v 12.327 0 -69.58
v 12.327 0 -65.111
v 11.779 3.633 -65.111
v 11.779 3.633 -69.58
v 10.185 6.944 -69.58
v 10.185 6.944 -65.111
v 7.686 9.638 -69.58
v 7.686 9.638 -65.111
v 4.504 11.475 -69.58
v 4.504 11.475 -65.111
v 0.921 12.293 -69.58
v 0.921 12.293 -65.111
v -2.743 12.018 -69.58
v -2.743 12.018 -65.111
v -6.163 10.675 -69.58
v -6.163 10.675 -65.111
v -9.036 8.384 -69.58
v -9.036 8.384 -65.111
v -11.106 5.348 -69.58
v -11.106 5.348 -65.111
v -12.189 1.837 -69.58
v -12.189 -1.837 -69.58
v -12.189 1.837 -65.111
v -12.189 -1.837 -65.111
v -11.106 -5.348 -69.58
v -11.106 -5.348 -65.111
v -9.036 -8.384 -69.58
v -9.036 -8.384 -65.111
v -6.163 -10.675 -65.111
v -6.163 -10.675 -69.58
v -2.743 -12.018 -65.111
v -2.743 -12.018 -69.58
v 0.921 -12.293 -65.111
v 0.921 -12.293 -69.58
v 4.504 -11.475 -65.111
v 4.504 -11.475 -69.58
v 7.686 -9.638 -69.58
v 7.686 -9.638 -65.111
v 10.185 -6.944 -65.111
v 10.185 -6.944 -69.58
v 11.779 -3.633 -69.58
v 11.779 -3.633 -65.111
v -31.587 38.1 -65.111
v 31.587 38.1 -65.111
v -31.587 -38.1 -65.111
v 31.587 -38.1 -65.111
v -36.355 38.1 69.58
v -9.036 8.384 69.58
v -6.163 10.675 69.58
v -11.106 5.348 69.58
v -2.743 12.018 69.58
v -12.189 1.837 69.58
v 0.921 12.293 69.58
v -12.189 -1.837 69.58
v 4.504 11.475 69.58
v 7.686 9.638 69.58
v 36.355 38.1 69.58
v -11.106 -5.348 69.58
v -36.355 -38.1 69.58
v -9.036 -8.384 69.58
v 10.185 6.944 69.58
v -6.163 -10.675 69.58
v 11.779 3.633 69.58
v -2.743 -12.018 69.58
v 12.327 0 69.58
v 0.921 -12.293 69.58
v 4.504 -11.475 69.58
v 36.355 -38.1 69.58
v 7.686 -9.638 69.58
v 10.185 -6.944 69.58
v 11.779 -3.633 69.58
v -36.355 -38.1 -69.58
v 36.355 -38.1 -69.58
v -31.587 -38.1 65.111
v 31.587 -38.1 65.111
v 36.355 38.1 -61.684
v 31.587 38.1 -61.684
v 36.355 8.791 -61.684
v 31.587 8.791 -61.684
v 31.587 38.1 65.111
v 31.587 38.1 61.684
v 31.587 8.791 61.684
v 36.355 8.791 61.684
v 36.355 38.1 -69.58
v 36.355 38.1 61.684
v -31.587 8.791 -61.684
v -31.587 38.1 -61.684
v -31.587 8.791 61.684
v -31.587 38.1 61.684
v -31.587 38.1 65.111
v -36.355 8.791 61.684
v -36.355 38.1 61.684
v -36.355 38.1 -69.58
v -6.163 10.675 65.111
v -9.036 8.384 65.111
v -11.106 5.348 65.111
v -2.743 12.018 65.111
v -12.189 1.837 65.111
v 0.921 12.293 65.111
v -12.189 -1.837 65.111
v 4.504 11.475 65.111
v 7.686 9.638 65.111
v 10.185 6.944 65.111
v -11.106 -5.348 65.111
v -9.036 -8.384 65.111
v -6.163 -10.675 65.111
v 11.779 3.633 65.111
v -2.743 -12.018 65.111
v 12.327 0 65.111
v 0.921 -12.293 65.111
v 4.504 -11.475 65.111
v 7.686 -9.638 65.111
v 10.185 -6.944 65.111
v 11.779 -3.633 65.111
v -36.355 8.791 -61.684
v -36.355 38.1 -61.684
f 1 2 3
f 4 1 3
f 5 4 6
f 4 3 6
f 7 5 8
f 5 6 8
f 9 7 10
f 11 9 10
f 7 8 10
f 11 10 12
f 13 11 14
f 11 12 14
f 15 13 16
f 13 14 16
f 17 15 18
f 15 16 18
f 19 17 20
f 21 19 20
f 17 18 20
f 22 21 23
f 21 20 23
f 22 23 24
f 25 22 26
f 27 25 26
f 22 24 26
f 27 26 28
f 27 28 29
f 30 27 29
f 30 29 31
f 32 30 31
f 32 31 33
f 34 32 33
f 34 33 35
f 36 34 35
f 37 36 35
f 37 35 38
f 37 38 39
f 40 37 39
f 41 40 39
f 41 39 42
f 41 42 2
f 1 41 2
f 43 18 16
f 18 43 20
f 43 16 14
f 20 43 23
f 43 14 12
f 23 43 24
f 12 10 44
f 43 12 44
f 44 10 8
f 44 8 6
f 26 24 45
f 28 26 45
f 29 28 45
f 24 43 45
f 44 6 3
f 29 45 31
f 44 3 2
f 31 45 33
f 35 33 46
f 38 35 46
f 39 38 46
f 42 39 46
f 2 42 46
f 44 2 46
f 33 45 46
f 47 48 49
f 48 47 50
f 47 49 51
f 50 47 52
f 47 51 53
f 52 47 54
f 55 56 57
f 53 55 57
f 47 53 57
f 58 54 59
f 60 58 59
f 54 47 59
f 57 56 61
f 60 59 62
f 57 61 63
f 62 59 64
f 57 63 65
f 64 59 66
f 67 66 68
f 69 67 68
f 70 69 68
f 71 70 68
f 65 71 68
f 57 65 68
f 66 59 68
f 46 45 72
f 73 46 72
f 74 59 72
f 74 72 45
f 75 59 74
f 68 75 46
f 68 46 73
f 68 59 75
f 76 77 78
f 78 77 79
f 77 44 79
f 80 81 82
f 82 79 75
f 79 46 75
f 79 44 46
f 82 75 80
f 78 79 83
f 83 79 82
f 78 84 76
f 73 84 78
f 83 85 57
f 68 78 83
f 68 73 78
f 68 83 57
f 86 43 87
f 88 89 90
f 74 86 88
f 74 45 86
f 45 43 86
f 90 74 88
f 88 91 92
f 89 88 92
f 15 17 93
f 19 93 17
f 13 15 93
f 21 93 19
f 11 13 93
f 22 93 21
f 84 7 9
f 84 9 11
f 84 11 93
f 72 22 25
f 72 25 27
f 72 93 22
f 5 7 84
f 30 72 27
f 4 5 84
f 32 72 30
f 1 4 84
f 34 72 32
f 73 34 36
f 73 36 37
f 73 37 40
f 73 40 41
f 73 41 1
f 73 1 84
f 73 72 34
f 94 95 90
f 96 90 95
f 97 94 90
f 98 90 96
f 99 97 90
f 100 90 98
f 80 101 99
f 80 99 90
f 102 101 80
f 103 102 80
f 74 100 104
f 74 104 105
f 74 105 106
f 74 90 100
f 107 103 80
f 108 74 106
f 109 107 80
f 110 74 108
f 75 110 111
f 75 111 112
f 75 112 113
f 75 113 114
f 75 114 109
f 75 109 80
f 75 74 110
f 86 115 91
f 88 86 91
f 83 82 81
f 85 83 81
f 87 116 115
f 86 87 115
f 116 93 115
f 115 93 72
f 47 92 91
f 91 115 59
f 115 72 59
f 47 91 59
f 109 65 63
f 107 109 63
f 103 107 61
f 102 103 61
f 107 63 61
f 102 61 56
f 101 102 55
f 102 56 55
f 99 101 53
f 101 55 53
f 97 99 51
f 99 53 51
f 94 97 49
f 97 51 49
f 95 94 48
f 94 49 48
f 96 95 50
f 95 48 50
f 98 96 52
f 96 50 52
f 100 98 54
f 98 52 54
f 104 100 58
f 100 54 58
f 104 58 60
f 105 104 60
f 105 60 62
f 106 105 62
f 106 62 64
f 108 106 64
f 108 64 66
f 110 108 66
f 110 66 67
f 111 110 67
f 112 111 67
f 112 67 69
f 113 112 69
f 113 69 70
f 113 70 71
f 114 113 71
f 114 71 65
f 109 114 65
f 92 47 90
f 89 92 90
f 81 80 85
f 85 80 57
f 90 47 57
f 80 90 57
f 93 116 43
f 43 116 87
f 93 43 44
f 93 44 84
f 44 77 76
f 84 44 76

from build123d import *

# Parameters (mm, degrees)
F0_W     = 72.709278
F0_H     = 139.160782
F1_DEPTH = 38.1
F2_W     = 63.17363
F2_H     = 130.221114
F3_DEPTH = 76.201
F4_R     = 12.32698
F5_DEPTH = 139.161782
F6_W     = 29.30933
F6_H     = 123.367376
F7_DEPTH = 72.710277


with BuildPart() as f1:
    # F0 (on Front) → F1 (new body, symmetric)
    with BuildSketch(Plane.XZ):
        Rectangle(F0_W, F0_H)
    extrude(amount=F1_DEPTH, both=True)

    # F2 (on face) → F3 (cut, through all)
    with BuildSketch(Plane.XZ.offset(38.1)):
        Rectangle(F2_W, F2_H)
    extrude(amount=-F3_DEPTH, mode=Mode.SUBTRACT)

    # F4 (on face) → F5 (cut, through all)
    with BuildSketch(Plane.XY.offset(69.580391)):
        Circle(F4_R)
    extrude(amount=-F5_DEPTH, mode=Mode.SUBTRACT)

    # F6 (on face) → F7 (cut, through all)
    with BuildSketch(Plane(origin=(-36.354639, 0, 0), x_dir=(0, -1, 0), z_dir=(-1, 0, 0))):
        with Locations((-23.445335, 0)):
            Rectangle(F6_W, F6_H)
        with Locations((-52.754665, 0)):
            Rectangle(F6_W, F6_H)
    extrude(amount=-F7_DEPTH, mode=Mode.SUBTRACT)


solid = f1.part
